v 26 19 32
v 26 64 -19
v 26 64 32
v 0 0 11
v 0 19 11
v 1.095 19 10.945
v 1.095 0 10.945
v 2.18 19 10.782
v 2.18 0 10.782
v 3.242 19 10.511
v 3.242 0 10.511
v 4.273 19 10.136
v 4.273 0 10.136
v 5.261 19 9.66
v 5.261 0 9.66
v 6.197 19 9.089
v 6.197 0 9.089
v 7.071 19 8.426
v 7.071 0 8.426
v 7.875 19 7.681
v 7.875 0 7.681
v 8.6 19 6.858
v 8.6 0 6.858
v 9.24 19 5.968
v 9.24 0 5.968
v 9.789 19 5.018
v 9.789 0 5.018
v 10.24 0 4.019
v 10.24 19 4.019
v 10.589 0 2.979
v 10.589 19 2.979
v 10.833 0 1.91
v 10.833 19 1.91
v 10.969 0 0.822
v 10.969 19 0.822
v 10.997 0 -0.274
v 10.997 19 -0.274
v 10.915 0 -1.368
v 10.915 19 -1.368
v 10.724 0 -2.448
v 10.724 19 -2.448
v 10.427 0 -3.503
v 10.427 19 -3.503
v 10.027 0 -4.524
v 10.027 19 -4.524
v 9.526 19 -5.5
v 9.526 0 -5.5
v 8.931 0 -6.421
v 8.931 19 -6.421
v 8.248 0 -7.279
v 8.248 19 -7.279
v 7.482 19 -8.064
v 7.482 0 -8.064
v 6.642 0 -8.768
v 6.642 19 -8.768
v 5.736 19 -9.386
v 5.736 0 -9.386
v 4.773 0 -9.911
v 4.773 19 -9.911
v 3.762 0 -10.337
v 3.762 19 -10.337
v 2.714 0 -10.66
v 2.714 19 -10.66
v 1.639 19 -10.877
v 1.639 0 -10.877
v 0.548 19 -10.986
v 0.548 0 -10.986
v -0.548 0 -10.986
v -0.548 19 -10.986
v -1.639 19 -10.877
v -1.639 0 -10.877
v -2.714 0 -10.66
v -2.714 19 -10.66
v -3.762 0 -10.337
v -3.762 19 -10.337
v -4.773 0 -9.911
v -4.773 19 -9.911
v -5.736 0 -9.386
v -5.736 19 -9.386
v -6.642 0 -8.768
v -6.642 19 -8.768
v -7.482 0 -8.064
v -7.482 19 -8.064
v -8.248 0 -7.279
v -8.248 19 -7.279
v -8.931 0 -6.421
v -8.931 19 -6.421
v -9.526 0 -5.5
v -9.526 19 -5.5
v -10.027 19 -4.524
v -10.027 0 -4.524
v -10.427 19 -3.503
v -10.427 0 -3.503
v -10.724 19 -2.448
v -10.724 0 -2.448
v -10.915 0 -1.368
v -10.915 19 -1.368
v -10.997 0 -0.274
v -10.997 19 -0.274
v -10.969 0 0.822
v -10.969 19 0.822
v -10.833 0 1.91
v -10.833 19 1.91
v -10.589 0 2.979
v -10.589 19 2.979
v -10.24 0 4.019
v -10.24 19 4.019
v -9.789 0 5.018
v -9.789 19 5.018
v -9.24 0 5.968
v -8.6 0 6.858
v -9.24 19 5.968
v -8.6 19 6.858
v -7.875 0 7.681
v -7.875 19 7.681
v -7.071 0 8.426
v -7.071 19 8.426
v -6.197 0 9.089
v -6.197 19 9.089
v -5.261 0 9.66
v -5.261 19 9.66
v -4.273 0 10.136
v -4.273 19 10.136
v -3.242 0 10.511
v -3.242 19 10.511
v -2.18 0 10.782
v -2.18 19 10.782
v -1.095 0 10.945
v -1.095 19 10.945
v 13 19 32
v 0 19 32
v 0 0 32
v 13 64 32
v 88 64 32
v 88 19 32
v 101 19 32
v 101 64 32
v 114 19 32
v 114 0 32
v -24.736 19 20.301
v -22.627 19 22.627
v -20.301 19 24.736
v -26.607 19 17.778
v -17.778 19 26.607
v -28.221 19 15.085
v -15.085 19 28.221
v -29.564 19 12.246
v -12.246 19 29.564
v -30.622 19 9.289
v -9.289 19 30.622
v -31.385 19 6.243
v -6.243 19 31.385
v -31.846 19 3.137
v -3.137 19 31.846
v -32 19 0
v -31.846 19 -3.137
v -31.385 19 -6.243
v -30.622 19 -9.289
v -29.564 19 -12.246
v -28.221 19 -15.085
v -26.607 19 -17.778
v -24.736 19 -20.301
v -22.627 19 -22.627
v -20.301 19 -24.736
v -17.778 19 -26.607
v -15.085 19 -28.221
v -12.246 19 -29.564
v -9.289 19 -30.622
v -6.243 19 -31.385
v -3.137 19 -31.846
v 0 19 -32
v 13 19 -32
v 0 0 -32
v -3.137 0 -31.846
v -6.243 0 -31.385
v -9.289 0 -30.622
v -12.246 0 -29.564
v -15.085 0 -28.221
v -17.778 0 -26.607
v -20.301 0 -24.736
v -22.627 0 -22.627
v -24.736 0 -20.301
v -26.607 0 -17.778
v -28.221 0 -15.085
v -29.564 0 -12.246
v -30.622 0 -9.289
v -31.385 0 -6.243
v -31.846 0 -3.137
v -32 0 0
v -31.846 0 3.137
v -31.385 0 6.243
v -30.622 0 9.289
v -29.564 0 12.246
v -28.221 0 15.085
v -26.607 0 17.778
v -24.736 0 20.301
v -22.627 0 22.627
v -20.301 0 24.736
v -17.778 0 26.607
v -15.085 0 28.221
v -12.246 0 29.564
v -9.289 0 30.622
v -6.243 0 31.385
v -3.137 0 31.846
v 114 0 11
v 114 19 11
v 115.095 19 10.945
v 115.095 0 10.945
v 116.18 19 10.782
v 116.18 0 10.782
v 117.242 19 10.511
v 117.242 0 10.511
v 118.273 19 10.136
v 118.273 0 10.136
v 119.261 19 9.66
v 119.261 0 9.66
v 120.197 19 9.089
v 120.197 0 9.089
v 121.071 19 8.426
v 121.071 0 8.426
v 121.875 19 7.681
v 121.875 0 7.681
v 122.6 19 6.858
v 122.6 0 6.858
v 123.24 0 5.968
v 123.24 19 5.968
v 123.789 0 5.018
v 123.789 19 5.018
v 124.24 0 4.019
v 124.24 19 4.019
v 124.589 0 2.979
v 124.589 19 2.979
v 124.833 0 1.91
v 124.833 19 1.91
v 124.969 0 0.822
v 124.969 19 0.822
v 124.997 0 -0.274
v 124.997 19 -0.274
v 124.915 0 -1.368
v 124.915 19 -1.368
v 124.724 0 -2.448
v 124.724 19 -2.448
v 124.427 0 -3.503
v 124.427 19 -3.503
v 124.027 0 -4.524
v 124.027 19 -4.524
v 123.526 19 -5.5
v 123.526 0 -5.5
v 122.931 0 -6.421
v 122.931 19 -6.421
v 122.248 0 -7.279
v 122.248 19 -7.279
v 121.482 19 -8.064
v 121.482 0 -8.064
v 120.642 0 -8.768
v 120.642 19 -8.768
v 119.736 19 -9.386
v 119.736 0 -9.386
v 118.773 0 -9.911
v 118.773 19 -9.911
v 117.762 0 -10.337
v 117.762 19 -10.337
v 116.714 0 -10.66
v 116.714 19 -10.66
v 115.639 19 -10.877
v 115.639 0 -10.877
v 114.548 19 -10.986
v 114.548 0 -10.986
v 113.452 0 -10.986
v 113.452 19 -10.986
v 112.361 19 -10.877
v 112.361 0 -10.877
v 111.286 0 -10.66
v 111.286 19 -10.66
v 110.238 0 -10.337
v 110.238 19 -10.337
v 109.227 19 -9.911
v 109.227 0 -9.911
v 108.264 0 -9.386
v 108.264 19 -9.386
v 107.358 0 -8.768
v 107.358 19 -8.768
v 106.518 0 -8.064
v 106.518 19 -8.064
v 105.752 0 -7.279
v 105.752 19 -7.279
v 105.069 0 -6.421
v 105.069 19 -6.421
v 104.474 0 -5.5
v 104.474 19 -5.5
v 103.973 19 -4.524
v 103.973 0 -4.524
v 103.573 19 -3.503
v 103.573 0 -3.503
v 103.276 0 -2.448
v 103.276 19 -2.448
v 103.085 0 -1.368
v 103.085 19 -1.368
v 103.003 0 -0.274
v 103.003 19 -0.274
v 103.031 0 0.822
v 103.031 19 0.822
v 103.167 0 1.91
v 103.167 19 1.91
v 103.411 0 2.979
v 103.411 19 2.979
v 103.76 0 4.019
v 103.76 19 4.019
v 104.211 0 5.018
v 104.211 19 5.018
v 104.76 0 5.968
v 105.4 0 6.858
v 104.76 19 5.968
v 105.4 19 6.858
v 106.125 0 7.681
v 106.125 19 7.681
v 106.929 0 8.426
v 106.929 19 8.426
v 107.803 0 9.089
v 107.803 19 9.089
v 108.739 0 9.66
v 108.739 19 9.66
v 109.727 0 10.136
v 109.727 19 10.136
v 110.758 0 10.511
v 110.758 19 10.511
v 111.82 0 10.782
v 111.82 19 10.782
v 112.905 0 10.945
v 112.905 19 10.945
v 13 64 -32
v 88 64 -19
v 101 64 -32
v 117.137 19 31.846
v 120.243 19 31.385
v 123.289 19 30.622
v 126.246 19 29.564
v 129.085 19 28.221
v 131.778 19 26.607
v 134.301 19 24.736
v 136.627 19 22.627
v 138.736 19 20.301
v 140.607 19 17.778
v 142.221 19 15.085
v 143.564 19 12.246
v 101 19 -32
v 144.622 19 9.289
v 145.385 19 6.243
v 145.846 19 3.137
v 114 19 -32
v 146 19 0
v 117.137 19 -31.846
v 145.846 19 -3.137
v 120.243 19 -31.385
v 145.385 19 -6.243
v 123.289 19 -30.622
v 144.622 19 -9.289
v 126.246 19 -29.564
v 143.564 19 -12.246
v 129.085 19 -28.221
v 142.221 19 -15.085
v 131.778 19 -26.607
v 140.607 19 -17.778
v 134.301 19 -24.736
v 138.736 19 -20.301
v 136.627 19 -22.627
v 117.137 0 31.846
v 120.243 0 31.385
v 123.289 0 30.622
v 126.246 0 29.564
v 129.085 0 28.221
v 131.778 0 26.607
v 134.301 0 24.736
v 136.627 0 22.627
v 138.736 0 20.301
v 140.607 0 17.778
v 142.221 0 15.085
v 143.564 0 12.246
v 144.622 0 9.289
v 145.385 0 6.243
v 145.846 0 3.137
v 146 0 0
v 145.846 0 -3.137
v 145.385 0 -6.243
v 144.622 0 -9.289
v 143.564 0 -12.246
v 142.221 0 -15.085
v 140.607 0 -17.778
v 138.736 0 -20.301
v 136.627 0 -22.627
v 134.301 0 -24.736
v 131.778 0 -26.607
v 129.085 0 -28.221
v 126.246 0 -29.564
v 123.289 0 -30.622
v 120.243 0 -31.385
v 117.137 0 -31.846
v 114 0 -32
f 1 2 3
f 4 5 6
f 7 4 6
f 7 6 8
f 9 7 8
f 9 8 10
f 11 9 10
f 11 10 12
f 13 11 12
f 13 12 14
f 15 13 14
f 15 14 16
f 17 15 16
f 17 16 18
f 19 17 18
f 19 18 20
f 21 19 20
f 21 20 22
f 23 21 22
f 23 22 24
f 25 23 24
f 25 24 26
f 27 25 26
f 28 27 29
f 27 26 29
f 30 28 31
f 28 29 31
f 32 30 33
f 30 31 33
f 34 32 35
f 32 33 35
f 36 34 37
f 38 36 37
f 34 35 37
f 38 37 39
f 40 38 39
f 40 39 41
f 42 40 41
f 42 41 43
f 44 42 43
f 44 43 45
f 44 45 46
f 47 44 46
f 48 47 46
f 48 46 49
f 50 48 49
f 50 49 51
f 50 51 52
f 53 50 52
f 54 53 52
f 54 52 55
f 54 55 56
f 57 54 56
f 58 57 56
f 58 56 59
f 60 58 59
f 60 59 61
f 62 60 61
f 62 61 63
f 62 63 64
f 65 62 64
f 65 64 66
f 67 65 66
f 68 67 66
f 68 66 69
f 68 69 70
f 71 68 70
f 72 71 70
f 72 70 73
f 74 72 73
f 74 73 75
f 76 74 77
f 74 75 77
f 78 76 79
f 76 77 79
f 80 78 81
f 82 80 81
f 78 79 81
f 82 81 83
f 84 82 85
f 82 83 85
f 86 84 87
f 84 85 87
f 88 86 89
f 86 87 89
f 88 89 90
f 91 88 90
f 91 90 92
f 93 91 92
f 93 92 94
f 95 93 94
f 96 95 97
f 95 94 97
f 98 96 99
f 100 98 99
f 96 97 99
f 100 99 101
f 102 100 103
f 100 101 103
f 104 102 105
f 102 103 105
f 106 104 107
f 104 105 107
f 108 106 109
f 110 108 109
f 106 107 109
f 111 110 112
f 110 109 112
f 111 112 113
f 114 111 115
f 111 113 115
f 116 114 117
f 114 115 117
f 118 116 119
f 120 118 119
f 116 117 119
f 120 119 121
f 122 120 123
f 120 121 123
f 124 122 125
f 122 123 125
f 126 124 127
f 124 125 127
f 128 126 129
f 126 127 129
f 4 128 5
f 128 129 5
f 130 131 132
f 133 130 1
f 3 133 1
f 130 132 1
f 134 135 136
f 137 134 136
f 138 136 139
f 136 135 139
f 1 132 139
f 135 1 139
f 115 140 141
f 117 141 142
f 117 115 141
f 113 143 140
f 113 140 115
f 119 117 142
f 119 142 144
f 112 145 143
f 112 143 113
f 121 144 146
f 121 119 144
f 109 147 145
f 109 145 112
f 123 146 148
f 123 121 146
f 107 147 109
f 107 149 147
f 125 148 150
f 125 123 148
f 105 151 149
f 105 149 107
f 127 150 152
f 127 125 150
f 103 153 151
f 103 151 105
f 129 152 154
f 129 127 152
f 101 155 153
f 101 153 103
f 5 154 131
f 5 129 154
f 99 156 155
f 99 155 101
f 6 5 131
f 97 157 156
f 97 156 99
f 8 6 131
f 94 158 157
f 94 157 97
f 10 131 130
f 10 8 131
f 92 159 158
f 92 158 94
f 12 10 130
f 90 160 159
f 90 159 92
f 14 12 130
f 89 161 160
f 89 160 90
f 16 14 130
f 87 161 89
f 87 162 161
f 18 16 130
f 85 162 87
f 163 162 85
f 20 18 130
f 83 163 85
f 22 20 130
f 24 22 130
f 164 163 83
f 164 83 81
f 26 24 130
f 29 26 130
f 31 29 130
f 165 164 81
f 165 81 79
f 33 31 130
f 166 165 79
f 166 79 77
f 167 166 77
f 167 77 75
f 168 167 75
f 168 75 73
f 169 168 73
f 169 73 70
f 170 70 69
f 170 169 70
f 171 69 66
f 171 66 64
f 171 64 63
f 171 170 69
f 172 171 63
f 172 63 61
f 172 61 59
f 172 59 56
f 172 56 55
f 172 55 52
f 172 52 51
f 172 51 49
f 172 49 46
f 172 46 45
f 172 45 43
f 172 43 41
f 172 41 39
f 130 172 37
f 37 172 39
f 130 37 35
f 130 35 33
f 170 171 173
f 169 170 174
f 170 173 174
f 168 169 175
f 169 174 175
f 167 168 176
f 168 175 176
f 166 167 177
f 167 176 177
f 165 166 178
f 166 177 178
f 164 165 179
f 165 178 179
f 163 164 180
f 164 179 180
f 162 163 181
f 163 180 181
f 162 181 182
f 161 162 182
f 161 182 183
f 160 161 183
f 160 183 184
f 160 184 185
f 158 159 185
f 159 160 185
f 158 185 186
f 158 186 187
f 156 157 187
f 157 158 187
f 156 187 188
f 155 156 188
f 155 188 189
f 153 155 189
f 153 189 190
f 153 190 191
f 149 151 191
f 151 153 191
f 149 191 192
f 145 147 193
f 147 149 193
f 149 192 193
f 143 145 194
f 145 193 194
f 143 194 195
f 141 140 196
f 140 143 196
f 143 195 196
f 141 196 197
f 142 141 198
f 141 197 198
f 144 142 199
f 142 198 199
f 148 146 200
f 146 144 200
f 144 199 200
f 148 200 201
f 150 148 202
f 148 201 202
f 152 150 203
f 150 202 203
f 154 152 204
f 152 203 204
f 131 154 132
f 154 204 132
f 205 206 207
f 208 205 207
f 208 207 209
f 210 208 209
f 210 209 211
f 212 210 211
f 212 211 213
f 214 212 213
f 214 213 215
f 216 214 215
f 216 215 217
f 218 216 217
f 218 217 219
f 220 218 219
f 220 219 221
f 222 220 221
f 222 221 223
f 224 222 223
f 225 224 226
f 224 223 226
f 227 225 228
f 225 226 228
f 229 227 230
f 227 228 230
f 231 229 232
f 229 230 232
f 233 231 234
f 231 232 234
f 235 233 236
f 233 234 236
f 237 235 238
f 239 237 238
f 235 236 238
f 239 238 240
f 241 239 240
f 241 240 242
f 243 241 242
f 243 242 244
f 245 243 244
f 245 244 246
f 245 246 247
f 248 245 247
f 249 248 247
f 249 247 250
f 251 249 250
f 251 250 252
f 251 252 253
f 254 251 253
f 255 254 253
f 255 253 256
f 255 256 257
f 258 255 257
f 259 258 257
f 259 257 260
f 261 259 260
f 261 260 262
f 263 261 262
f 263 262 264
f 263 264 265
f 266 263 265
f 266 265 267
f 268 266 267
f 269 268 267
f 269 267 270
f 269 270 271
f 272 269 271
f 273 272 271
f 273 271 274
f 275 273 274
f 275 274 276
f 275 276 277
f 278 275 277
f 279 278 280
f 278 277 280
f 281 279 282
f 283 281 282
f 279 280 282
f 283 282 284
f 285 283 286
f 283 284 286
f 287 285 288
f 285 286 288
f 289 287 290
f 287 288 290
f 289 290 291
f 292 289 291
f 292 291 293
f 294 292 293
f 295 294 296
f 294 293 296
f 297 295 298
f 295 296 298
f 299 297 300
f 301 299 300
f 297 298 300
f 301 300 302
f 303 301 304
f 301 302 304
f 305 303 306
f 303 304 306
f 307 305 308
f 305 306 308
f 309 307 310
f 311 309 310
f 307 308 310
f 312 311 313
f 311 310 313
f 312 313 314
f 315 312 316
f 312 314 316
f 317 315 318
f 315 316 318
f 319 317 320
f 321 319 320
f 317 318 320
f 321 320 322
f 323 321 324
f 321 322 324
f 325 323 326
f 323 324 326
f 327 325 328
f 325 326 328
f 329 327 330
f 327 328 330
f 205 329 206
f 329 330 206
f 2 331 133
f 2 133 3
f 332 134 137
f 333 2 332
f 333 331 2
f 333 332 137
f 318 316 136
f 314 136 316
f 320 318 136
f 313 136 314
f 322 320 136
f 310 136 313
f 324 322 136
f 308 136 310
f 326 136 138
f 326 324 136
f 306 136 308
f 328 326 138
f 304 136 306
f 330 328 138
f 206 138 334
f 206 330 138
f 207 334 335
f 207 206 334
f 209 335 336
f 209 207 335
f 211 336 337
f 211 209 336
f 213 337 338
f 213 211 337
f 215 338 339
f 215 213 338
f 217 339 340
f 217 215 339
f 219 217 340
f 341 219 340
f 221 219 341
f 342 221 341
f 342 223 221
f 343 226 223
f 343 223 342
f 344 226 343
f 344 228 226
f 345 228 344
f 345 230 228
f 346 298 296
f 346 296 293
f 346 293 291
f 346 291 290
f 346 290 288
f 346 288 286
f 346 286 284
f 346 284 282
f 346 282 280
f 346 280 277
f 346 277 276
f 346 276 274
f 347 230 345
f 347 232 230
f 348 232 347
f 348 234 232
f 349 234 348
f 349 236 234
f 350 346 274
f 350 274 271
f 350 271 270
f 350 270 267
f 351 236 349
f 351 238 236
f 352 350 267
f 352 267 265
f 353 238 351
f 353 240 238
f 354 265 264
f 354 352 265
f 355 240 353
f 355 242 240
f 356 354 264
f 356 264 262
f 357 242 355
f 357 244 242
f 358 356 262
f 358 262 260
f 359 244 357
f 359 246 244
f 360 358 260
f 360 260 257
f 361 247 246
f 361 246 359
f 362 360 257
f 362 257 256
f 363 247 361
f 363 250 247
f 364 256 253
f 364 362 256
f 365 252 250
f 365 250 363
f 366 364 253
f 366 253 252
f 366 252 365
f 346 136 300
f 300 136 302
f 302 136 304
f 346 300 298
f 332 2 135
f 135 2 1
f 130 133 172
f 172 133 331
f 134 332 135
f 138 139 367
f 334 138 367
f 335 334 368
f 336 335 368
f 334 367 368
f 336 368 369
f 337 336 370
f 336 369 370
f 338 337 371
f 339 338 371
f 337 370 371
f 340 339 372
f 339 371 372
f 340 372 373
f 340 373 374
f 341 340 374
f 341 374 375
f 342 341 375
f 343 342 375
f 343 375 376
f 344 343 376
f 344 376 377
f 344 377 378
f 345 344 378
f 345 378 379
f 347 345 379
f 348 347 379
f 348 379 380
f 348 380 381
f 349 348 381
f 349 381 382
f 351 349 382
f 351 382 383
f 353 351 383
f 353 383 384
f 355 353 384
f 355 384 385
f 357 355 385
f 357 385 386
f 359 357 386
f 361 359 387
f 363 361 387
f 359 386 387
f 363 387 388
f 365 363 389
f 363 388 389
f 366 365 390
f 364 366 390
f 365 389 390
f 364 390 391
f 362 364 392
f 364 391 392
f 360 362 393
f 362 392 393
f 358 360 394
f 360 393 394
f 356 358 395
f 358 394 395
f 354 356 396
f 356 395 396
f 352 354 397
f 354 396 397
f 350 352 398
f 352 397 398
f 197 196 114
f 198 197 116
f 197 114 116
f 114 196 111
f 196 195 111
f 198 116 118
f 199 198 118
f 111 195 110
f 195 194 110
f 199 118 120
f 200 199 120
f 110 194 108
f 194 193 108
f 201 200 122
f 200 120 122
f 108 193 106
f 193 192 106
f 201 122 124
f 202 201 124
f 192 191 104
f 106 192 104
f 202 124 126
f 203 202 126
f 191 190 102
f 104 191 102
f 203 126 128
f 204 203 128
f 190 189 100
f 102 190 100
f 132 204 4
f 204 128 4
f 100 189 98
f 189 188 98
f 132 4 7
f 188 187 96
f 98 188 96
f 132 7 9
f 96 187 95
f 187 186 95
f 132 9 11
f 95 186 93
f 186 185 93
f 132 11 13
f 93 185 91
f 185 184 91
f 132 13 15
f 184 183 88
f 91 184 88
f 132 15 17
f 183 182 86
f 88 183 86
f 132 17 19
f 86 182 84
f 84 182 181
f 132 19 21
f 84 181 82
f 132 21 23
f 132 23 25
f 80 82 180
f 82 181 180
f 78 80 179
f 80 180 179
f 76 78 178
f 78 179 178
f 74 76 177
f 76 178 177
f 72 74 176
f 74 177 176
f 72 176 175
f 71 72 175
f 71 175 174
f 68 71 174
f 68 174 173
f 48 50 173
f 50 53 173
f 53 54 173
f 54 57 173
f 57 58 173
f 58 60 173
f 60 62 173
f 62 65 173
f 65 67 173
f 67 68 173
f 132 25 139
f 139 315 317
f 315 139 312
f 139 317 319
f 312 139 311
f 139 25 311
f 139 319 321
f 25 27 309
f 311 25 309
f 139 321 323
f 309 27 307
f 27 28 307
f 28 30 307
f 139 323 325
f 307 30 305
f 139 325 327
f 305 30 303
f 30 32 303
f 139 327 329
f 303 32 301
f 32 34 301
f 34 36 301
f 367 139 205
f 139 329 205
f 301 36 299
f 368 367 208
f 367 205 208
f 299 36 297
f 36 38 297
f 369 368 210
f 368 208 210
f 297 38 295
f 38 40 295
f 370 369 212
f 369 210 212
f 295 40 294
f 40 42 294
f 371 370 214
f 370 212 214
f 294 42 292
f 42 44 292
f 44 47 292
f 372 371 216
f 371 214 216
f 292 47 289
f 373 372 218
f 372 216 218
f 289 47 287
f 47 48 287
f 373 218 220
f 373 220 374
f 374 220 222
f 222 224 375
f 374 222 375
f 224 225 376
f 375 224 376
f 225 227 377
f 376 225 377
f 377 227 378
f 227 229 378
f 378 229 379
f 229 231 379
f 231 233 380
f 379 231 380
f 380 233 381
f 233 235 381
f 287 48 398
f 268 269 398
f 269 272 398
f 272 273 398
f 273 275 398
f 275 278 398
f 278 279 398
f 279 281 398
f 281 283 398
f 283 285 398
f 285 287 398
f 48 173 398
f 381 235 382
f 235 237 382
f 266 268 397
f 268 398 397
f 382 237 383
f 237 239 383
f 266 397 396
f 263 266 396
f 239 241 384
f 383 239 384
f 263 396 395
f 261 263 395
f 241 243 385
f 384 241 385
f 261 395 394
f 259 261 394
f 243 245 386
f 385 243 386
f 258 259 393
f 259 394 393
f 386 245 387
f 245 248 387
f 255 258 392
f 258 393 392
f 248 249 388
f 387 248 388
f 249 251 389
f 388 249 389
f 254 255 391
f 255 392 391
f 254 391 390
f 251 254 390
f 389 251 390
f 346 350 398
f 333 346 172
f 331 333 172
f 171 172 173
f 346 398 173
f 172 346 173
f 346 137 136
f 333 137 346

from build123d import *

# Parameters (mm, degrees)
BOSS_EXTRUDE2_DEPTH = 64
CUT_EXTRUDE3_START  = -45
CUT_EXTRUDE3_DEPTH  = 45
SKETCH7_R           = 11
CUT_EXTRUDE5_DEPTH  = 96
SKETCH8_R           = 11
CUT_EXTRUDE6_DEPTH  = 105
CUT_EXTRUDE7_START  = -45
CUT_EXTRUDE7_DEPTH  = 45
SKETCH10_W          = 13
SKETCH10_H          = 64
CUT_EXTRUDE8_DEPTH  = 45
SKETCH11_W          = 13
SKETCH11_H          = 64
CUT_EXTRUDE9_DEPTH  = 45
CUT_EXTRUDE12_DEPTH = 31
CUT_EXTRUDE13_DEPTH = 31


with BuildPart() as part:
    # Sketch1 → Boss-Extrude2 (new body)
    with BuildSketch(Plane(origin=(0, 0, 0), x_dir=(1, 0, 0), z_dir=(0, 1, 0))):
        with BuildLine():
            Line((0, -32), (114, -32))
            ThreePointArc((114, -32), (146, 0), (114, 32))
            Line((114, 32), (0, 32))
            ThreePointArc((0, 32), (-32, 0), (0, -32))
        make_face()
    extrude(amount=BOSS_EXTRUDE2_DEPTH)

    # Sketch6 → Cut-Extrude3 (cut)
    with BuildSketch(Plane(origin=(0, 64, 0), x_dir=(1, 0, 0), z_dir=(0, 1, 0)).offset(CUT_EXTRUDE3_START)):
        with BuildLine():
            Line((0, 32), (0, -32))
            ThreePointArc((0, -32), (-32, 0), (0, 32))
        make_face()
    extrude(amount=CUT_EXTRUDE3_DEPTH, mode=Mode.SUBTRACT)

    # Sketch7 → Cut-Extrude5 (cut)
    with BuildSketch(Plane(origin=(0, 64, 0), x_dir=(1, 0, 0), z_dir=(0, 1, 0))):
        with Locations(Location((0, 0, 0), (0, 0, 270))):
            Circle(SKETCH7_R)
    extrude(amount=-CUT_EXTRUDE5_DEPTH, mode=Mode.SUBTRACT)

    # Sketch8 → Cut-Extrude6 (cut)
    with BuildSketch(Plane(origin=(0, 64, 0), x_dir=(1, 0, 0), z_dir=(0, 1, 0))):
        with Locations(Location((114, 0, 0), (0, 0, 270))):
            Circle(SKETCH8_R)
    extrude(amount=-CUT_EXTRUDE6_DEPTH, mode=Mode.SUBTRACT)

    # Sketch9 → Cut-Extrude7 (cut)
    with BuildSketch(Plane(origin=(0, 64, 0), x_dir=(1, 0, 0), z_dir=(0, 1, 0)).offset(CUT_EXTRUDE7_START)):
        with BuildLine():
            Line((114, 32), (114, -32))
            ThreePointArc((114, -32), (146, 0), (114, 32))
        make_face()
    extrude(amount=CUT_EXTRUDE7_DEPTH, mode=Mode.SUBTRACT)

    # Sketch10 → Cut-Extrude8 (cut)
    with BuildSketch(Plane(origin=(0, 64, 0), x_dir=(1, 0, 0), z_dir=(0, 1, 0))):
        with Locations((6.5, 0)):
            Rectangle(SKETCH10_W, SKETCH10_H)
    extrude(amount=-CUT_EXTRUDE8_DEPTH, mode=Mode.SUBTRACT)

    # Sketch11 → Cut-Extrude9 (cut)
    with BuildSketch(Plane(origin=(0, 64, 0), x_dir=(1, 0, 0), z_dir=(0, 1, 0))):
        with Locations((107.5, 0)):
            Rectangle(SKETCH11_W, SKETCH11_H)
    extrude(amount=-CUT_EXTRUDE9_DEPTH, mode=Mode.SUBTRACT)

    # Sketch15 → Cut-Extrude12 (cut)
    with BuildSketch(Plane.ZY.offset(-57)):
        Polygon((-19, 64), (32, 19), (32, 64), align=None)
    extrude(amount=-CUT_EXTRUDE12_DEPTH, mode=Mode.SUBTRACT)

    # Sketch16 → Cut-Extrude13 (cut)
    with BuildSketch(Plane(origin=(57, 0, 0), x_dir=(0, 0, -1), z_dir=(1, 0, 0))):
        Polygon((-32, 64), (19, 64), (-32, 19), align=None)
    extrude(amount=-CUT_EXTRUDE13_DEPTH, mode=Mode.SUBTRACT)


solid = part.part
